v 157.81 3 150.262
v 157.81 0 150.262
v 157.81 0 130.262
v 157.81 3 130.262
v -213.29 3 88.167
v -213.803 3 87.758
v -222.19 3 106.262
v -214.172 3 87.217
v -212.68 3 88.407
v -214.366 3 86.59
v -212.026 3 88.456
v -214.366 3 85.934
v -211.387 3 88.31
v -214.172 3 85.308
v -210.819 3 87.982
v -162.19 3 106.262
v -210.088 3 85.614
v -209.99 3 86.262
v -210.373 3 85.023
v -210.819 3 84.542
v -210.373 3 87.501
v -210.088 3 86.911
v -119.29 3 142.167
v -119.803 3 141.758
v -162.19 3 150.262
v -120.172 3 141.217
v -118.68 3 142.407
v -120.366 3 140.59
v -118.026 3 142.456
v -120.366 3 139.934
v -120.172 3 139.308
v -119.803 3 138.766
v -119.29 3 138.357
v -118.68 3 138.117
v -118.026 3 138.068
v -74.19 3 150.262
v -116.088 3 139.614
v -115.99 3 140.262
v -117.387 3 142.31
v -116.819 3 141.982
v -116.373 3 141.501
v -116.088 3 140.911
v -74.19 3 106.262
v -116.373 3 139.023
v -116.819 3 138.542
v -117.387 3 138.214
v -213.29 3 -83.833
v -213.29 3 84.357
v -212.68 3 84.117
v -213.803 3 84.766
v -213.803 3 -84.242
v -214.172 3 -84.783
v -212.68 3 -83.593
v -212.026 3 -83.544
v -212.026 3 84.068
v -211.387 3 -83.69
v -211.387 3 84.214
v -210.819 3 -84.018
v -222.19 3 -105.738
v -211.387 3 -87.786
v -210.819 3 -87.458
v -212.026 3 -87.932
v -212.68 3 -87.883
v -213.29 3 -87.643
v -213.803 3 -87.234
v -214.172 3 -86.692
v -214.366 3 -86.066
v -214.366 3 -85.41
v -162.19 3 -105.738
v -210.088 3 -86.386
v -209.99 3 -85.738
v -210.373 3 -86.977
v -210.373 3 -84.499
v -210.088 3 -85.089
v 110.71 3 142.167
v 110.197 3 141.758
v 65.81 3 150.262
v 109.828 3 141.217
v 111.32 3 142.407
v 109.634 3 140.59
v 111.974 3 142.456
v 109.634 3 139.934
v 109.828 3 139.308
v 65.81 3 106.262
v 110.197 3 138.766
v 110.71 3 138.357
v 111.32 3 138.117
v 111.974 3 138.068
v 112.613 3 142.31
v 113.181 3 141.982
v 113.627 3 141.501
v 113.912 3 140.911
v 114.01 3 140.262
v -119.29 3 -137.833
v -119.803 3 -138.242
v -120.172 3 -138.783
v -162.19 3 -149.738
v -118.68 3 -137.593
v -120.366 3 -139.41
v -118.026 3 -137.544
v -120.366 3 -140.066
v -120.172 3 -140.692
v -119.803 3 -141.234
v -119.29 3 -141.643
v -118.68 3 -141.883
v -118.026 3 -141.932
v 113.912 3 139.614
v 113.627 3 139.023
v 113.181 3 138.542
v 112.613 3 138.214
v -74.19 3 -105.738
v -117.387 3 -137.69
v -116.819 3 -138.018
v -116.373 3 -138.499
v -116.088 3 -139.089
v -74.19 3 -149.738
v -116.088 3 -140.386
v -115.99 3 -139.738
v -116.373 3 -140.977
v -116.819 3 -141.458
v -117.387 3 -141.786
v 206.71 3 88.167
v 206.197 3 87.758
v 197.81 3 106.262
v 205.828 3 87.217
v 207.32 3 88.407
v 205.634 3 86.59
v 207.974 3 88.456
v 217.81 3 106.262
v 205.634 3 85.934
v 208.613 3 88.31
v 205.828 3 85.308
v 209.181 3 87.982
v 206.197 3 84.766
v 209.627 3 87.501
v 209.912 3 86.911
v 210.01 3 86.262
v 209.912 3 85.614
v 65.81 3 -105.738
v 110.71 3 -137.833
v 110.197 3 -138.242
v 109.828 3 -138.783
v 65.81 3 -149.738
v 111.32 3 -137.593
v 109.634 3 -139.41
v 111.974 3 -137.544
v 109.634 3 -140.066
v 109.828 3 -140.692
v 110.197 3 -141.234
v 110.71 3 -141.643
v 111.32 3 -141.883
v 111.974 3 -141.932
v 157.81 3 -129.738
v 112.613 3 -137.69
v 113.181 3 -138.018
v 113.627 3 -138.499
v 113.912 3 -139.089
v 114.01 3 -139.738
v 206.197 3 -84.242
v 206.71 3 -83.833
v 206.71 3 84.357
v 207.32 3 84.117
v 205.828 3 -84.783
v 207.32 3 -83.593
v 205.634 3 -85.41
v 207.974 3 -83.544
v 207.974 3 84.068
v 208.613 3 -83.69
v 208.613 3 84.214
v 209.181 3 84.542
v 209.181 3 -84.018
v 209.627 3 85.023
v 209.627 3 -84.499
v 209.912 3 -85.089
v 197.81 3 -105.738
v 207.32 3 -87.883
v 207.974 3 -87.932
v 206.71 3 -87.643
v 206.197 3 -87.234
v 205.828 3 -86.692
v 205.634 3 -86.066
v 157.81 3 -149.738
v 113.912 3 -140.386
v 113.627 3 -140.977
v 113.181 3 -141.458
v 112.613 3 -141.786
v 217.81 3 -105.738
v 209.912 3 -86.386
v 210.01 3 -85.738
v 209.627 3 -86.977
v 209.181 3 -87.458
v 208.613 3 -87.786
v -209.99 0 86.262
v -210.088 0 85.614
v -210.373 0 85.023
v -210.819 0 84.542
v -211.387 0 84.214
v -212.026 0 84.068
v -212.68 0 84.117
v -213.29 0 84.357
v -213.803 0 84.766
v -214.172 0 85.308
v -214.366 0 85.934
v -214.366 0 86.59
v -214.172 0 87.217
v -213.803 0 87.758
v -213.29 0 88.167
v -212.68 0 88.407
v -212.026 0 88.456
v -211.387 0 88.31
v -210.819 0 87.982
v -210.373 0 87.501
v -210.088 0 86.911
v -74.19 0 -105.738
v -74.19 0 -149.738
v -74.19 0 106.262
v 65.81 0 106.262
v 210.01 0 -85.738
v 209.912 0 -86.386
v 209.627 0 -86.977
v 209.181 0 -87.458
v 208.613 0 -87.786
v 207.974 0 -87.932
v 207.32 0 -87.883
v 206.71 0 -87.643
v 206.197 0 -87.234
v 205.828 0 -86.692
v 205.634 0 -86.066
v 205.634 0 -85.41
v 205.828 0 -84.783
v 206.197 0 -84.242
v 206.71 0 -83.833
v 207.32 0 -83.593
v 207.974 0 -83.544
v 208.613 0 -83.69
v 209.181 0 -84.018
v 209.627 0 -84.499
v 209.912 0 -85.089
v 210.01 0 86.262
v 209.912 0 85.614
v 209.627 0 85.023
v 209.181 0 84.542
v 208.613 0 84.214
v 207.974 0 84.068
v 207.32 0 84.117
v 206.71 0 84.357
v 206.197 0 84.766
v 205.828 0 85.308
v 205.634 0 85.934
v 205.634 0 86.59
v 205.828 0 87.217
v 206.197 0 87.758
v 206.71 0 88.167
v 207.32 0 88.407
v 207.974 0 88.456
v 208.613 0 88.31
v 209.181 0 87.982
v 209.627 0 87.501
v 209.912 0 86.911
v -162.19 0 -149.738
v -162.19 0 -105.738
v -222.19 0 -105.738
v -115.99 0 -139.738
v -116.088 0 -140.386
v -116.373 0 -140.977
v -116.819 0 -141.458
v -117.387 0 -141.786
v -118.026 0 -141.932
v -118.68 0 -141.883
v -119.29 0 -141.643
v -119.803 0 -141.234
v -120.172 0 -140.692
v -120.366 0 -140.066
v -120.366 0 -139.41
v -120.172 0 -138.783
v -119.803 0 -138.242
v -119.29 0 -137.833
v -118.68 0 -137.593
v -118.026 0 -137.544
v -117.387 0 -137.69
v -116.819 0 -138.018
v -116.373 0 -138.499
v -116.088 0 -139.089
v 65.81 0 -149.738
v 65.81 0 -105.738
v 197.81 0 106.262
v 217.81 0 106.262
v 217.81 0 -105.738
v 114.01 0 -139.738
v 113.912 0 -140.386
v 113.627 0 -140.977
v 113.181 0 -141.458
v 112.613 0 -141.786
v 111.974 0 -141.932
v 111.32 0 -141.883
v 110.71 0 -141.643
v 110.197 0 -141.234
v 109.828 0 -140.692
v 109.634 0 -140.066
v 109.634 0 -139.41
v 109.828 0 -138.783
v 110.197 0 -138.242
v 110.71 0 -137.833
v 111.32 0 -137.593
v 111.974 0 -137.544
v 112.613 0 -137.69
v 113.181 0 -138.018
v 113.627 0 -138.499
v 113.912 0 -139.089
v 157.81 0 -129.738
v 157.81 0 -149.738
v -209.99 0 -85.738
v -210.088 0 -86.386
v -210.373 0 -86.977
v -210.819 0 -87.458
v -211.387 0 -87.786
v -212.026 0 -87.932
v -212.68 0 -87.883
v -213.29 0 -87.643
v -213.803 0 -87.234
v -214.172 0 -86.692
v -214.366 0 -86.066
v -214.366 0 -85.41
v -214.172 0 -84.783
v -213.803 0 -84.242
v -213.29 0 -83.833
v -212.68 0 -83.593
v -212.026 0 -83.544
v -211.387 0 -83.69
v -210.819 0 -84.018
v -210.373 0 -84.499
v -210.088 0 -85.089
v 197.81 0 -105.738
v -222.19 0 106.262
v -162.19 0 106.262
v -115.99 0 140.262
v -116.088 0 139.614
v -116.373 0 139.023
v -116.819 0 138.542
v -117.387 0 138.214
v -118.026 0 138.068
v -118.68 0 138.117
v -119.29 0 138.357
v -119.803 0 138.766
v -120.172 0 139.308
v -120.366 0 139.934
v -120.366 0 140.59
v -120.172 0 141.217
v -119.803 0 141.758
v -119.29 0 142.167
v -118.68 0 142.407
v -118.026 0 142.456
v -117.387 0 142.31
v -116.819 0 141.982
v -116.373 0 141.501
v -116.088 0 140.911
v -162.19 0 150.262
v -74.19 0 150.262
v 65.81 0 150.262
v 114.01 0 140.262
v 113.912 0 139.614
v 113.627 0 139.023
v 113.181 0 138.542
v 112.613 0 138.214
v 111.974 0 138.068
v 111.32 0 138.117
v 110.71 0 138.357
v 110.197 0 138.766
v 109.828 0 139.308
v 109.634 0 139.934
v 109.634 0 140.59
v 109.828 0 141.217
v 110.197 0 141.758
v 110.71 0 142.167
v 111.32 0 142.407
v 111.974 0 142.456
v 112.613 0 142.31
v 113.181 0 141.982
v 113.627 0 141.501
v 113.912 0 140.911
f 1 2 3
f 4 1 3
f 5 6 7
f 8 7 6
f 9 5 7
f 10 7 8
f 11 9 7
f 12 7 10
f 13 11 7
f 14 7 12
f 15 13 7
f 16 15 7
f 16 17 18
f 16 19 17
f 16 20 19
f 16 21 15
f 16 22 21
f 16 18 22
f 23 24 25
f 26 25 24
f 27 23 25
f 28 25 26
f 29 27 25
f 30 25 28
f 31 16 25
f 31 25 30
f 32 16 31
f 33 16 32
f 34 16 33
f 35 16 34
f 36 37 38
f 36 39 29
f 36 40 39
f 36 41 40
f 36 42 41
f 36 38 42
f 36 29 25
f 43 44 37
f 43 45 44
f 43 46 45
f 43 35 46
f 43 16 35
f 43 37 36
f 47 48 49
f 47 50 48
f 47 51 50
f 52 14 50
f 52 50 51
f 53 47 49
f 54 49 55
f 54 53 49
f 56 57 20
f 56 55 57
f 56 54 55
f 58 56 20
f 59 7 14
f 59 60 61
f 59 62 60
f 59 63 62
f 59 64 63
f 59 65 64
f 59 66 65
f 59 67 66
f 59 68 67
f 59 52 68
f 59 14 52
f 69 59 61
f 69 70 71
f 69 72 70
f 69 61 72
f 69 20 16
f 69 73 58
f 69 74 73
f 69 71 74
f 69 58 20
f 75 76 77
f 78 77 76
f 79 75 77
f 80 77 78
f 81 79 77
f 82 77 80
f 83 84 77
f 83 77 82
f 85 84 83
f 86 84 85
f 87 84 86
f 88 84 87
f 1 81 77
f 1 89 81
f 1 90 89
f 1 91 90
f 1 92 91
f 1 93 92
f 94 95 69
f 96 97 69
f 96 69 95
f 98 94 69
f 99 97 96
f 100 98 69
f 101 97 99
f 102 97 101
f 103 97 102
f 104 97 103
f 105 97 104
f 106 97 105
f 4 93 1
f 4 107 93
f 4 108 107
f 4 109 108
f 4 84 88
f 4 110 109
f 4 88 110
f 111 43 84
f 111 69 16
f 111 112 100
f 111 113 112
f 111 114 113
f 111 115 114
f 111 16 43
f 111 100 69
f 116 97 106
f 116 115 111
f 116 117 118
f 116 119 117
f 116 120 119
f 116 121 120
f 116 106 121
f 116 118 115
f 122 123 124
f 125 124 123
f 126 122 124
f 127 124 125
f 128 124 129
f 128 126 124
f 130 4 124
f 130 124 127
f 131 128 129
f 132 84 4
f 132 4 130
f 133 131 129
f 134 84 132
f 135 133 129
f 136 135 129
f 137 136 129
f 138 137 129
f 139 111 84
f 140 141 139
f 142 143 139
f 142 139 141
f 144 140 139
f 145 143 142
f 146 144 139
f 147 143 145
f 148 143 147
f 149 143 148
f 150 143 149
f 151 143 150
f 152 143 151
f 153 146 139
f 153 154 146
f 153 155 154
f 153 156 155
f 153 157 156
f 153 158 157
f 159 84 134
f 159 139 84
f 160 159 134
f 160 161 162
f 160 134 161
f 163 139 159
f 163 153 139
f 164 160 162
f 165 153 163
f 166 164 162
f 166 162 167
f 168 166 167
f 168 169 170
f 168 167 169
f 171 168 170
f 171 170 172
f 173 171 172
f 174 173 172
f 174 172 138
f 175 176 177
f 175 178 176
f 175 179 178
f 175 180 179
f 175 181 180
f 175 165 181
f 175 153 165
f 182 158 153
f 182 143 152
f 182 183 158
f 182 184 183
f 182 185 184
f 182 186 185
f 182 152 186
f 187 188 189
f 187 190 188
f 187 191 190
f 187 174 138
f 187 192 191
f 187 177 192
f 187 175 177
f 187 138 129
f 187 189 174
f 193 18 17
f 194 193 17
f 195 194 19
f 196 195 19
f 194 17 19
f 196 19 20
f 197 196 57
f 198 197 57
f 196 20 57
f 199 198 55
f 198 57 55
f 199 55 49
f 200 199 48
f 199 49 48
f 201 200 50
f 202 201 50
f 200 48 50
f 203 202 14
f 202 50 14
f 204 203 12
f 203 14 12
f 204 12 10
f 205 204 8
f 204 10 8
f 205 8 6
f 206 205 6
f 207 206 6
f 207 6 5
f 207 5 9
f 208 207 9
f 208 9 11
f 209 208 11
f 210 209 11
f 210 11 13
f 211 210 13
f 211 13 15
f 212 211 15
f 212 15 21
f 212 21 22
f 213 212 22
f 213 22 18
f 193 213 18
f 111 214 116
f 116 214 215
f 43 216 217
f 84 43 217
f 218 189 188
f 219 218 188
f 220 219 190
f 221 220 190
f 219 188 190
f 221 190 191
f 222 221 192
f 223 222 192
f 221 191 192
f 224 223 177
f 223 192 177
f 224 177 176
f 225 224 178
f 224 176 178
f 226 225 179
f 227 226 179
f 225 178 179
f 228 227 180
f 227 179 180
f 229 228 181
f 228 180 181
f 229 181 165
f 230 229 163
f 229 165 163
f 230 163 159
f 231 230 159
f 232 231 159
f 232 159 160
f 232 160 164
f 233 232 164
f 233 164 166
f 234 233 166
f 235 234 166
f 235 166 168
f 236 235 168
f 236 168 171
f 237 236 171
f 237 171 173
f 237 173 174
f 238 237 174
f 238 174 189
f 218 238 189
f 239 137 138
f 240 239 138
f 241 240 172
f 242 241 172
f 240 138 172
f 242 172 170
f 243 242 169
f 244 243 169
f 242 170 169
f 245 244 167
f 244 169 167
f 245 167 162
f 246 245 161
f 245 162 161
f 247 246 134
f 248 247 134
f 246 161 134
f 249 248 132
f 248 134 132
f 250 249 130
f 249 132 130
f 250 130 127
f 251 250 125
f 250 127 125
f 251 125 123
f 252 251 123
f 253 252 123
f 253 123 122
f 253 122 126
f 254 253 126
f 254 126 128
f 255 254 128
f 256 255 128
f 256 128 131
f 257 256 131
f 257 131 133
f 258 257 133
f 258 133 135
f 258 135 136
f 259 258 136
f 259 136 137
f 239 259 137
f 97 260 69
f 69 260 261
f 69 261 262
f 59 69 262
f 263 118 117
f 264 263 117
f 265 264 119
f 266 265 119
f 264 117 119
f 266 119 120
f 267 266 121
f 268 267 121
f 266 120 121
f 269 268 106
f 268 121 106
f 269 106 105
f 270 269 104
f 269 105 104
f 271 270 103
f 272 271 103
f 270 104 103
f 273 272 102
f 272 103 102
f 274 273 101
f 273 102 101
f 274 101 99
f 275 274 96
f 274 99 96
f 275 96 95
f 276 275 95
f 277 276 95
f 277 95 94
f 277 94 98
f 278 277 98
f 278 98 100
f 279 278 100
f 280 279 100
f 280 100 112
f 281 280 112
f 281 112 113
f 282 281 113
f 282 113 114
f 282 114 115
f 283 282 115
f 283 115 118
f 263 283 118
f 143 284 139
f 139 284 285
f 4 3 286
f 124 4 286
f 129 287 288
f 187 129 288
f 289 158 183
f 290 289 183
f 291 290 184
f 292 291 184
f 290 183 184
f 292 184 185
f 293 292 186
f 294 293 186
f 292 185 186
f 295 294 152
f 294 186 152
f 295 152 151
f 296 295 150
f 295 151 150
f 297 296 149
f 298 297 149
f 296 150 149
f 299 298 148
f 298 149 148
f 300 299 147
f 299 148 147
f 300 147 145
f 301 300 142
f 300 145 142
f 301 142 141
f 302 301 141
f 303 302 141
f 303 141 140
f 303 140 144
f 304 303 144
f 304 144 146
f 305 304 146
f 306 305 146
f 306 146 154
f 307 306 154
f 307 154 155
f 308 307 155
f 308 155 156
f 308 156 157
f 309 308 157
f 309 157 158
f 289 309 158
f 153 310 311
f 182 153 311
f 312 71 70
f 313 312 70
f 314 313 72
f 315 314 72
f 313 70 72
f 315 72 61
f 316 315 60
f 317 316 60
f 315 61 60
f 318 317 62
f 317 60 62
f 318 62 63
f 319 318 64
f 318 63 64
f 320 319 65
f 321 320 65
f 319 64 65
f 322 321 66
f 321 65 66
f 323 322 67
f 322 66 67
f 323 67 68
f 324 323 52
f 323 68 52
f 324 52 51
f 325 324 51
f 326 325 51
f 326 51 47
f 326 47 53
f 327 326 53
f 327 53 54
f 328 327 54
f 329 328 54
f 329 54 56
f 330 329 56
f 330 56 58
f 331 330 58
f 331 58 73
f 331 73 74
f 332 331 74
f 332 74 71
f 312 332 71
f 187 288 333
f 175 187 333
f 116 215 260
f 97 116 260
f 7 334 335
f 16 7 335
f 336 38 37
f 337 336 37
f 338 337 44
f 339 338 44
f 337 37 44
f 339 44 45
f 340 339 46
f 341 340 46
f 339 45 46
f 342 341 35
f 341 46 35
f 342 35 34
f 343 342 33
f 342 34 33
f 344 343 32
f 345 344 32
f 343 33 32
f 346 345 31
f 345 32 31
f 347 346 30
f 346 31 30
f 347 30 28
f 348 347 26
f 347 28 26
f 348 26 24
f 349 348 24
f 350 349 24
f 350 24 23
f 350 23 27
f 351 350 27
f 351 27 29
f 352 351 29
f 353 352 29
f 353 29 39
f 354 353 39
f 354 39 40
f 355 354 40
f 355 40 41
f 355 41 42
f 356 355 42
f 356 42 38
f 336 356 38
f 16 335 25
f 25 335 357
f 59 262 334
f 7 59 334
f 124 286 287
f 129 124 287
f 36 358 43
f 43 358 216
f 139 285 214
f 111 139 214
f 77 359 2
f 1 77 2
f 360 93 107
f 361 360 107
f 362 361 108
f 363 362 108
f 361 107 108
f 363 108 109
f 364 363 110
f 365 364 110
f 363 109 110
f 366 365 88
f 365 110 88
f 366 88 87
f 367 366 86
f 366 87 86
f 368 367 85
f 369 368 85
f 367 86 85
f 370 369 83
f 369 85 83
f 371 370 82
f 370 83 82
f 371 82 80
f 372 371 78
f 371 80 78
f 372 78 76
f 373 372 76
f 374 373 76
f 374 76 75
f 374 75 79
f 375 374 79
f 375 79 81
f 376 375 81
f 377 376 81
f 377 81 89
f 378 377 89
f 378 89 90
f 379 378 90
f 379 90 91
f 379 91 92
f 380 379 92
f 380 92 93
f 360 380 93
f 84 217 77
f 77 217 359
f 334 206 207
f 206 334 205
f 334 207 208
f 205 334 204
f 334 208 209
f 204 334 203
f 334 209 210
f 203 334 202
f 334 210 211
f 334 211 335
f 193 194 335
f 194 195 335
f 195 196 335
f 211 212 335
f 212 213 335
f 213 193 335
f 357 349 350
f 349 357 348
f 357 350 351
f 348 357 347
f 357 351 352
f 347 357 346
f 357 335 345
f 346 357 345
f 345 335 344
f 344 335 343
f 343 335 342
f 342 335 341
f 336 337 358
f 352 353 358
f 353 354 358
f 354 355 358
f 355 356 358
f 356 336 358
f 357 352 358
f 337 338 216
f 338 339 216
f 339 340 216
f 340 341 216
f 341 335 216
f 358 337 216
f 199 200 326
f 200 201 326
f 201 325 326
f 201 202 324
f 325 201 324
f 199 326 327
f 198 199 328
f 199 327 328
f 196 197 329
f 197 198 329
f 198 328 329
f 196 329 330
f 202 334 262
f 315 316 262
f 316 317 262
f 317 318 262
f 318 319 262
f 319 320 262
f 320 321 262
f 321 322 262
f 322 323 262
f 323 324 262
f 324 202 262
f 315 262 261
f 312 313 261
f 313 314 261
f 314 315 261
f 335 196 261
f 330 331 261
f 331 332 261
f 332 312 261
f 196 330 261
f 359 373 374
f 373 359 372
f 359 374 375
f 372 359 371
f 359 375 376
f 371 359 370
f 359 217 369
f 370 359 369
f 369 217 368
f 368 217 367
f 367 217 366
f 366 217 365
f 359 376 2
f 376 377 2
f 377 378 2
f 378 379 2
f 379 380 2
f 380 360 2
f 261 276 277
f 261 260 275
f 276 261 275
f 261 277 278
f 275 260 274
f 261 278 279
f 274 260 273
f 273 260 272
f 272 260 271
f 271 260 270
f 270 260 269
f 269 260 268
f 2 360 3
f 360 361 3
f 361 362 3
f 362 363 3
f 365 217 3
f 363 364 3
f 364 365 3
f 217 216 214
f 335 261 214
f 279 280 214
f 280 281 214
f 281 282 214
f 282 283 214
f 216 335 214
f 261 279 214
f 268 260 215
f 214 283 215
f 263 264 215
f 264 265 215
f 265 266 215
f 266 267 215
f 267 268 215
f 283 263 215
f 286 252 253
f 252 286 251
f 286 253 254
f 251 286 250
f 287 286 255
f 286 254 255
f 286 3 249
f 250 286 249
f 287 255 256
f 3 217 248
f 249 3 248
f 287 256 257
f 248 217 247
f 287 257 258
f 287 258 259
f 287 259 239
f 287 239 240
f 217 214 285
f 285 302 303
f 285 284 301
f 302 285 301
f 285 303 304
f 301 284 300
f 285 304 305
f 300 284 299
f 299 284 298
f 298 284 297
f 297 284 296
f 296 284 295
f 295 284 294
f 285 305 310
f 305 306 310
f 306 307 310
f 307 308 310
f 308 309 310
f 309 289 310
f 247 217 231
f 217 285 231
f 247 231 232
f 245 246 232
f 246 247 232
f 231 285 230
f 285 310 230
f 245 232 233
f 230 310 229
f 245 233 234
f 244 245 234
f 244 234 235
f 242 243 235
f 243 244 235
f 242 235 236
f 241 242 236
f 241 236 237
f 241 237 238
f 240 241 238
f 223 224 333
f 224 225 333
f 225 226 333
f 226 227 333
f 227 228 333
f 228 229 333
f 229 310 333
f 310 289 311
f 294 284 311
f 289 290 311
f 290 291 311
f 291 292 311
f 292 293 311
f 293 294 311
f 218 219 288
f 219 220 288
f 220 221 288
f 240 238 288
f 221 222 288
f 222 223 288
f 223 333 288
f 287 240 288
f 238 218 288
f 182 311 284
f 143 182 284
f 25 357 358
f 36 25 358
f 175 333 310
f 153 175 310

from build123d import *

# Parameters (mm, degrees)
BOSS_EXTRU_1_DEPTH   = 3
D_GAGEMENT_M41_D     = 4.4
D_GAGEMENT_M41_DEPTH = 5


with BuildPart() as part:
    # Esquisse4 → Boss.-Extru.1 (new body)
    with BuildSketch(Plane(origin=(0, 0, 0), x_dir=(1, 0, 0), z_dir=(0, 1, 0))):
        Polygon((197.809683941, 105.737894452), (157.80968394, 129.737894452), (157.80968394, 149.737894452), (65.80968453, 149.737894452), (65.80968453, 105.737894452), (-74.19031547, 105.737894452), (-74.19031547, 149.737894452), (-162.1903155, 149.737894452), (-162.1903155, 105.737894452), (-222.1903155, 105.737894452), (-222.1903155, -106.262104989), (-162.1903155, -106.262104989), (-162.1903155, -150.262104989), (-74.19031547, -150.262104989), (-74.19031547, -106.262104989), (65.80968453, -106.262104989), (65.80968453, -150.262104989), (157.80968394, -150.262104989), (157.80968394, -130.262104989), (197.809683941, -106.262104989), (217.809683941, -106.262104989), (217.809683941, 105.737894452), align=None)
    extrude(amount=BOSS_EXTRU_1_DEPTH)

    # Dégagement M41
    with Locations(Plane(origin=(0, 0, 0), x_dir=(-1, 0, 0), z_dir=(0, -1, 0))):
        with Locations((-207.809683941, 85.737894452), (-207.809683941, -86.262104989), (-111.809684235, -140.262104989), (118.190315485, -140.262104989), (-111.809684235, 139.737894452), (118.190315485, 139.737894452), (212.1903155, 85.737894452), (212.1903155, -86.262104989)):
            Hole(D_GAGEMENT_M41_D / 2, depth=D_GAGEMENT_M41_DEPTH)


solid = part.part
